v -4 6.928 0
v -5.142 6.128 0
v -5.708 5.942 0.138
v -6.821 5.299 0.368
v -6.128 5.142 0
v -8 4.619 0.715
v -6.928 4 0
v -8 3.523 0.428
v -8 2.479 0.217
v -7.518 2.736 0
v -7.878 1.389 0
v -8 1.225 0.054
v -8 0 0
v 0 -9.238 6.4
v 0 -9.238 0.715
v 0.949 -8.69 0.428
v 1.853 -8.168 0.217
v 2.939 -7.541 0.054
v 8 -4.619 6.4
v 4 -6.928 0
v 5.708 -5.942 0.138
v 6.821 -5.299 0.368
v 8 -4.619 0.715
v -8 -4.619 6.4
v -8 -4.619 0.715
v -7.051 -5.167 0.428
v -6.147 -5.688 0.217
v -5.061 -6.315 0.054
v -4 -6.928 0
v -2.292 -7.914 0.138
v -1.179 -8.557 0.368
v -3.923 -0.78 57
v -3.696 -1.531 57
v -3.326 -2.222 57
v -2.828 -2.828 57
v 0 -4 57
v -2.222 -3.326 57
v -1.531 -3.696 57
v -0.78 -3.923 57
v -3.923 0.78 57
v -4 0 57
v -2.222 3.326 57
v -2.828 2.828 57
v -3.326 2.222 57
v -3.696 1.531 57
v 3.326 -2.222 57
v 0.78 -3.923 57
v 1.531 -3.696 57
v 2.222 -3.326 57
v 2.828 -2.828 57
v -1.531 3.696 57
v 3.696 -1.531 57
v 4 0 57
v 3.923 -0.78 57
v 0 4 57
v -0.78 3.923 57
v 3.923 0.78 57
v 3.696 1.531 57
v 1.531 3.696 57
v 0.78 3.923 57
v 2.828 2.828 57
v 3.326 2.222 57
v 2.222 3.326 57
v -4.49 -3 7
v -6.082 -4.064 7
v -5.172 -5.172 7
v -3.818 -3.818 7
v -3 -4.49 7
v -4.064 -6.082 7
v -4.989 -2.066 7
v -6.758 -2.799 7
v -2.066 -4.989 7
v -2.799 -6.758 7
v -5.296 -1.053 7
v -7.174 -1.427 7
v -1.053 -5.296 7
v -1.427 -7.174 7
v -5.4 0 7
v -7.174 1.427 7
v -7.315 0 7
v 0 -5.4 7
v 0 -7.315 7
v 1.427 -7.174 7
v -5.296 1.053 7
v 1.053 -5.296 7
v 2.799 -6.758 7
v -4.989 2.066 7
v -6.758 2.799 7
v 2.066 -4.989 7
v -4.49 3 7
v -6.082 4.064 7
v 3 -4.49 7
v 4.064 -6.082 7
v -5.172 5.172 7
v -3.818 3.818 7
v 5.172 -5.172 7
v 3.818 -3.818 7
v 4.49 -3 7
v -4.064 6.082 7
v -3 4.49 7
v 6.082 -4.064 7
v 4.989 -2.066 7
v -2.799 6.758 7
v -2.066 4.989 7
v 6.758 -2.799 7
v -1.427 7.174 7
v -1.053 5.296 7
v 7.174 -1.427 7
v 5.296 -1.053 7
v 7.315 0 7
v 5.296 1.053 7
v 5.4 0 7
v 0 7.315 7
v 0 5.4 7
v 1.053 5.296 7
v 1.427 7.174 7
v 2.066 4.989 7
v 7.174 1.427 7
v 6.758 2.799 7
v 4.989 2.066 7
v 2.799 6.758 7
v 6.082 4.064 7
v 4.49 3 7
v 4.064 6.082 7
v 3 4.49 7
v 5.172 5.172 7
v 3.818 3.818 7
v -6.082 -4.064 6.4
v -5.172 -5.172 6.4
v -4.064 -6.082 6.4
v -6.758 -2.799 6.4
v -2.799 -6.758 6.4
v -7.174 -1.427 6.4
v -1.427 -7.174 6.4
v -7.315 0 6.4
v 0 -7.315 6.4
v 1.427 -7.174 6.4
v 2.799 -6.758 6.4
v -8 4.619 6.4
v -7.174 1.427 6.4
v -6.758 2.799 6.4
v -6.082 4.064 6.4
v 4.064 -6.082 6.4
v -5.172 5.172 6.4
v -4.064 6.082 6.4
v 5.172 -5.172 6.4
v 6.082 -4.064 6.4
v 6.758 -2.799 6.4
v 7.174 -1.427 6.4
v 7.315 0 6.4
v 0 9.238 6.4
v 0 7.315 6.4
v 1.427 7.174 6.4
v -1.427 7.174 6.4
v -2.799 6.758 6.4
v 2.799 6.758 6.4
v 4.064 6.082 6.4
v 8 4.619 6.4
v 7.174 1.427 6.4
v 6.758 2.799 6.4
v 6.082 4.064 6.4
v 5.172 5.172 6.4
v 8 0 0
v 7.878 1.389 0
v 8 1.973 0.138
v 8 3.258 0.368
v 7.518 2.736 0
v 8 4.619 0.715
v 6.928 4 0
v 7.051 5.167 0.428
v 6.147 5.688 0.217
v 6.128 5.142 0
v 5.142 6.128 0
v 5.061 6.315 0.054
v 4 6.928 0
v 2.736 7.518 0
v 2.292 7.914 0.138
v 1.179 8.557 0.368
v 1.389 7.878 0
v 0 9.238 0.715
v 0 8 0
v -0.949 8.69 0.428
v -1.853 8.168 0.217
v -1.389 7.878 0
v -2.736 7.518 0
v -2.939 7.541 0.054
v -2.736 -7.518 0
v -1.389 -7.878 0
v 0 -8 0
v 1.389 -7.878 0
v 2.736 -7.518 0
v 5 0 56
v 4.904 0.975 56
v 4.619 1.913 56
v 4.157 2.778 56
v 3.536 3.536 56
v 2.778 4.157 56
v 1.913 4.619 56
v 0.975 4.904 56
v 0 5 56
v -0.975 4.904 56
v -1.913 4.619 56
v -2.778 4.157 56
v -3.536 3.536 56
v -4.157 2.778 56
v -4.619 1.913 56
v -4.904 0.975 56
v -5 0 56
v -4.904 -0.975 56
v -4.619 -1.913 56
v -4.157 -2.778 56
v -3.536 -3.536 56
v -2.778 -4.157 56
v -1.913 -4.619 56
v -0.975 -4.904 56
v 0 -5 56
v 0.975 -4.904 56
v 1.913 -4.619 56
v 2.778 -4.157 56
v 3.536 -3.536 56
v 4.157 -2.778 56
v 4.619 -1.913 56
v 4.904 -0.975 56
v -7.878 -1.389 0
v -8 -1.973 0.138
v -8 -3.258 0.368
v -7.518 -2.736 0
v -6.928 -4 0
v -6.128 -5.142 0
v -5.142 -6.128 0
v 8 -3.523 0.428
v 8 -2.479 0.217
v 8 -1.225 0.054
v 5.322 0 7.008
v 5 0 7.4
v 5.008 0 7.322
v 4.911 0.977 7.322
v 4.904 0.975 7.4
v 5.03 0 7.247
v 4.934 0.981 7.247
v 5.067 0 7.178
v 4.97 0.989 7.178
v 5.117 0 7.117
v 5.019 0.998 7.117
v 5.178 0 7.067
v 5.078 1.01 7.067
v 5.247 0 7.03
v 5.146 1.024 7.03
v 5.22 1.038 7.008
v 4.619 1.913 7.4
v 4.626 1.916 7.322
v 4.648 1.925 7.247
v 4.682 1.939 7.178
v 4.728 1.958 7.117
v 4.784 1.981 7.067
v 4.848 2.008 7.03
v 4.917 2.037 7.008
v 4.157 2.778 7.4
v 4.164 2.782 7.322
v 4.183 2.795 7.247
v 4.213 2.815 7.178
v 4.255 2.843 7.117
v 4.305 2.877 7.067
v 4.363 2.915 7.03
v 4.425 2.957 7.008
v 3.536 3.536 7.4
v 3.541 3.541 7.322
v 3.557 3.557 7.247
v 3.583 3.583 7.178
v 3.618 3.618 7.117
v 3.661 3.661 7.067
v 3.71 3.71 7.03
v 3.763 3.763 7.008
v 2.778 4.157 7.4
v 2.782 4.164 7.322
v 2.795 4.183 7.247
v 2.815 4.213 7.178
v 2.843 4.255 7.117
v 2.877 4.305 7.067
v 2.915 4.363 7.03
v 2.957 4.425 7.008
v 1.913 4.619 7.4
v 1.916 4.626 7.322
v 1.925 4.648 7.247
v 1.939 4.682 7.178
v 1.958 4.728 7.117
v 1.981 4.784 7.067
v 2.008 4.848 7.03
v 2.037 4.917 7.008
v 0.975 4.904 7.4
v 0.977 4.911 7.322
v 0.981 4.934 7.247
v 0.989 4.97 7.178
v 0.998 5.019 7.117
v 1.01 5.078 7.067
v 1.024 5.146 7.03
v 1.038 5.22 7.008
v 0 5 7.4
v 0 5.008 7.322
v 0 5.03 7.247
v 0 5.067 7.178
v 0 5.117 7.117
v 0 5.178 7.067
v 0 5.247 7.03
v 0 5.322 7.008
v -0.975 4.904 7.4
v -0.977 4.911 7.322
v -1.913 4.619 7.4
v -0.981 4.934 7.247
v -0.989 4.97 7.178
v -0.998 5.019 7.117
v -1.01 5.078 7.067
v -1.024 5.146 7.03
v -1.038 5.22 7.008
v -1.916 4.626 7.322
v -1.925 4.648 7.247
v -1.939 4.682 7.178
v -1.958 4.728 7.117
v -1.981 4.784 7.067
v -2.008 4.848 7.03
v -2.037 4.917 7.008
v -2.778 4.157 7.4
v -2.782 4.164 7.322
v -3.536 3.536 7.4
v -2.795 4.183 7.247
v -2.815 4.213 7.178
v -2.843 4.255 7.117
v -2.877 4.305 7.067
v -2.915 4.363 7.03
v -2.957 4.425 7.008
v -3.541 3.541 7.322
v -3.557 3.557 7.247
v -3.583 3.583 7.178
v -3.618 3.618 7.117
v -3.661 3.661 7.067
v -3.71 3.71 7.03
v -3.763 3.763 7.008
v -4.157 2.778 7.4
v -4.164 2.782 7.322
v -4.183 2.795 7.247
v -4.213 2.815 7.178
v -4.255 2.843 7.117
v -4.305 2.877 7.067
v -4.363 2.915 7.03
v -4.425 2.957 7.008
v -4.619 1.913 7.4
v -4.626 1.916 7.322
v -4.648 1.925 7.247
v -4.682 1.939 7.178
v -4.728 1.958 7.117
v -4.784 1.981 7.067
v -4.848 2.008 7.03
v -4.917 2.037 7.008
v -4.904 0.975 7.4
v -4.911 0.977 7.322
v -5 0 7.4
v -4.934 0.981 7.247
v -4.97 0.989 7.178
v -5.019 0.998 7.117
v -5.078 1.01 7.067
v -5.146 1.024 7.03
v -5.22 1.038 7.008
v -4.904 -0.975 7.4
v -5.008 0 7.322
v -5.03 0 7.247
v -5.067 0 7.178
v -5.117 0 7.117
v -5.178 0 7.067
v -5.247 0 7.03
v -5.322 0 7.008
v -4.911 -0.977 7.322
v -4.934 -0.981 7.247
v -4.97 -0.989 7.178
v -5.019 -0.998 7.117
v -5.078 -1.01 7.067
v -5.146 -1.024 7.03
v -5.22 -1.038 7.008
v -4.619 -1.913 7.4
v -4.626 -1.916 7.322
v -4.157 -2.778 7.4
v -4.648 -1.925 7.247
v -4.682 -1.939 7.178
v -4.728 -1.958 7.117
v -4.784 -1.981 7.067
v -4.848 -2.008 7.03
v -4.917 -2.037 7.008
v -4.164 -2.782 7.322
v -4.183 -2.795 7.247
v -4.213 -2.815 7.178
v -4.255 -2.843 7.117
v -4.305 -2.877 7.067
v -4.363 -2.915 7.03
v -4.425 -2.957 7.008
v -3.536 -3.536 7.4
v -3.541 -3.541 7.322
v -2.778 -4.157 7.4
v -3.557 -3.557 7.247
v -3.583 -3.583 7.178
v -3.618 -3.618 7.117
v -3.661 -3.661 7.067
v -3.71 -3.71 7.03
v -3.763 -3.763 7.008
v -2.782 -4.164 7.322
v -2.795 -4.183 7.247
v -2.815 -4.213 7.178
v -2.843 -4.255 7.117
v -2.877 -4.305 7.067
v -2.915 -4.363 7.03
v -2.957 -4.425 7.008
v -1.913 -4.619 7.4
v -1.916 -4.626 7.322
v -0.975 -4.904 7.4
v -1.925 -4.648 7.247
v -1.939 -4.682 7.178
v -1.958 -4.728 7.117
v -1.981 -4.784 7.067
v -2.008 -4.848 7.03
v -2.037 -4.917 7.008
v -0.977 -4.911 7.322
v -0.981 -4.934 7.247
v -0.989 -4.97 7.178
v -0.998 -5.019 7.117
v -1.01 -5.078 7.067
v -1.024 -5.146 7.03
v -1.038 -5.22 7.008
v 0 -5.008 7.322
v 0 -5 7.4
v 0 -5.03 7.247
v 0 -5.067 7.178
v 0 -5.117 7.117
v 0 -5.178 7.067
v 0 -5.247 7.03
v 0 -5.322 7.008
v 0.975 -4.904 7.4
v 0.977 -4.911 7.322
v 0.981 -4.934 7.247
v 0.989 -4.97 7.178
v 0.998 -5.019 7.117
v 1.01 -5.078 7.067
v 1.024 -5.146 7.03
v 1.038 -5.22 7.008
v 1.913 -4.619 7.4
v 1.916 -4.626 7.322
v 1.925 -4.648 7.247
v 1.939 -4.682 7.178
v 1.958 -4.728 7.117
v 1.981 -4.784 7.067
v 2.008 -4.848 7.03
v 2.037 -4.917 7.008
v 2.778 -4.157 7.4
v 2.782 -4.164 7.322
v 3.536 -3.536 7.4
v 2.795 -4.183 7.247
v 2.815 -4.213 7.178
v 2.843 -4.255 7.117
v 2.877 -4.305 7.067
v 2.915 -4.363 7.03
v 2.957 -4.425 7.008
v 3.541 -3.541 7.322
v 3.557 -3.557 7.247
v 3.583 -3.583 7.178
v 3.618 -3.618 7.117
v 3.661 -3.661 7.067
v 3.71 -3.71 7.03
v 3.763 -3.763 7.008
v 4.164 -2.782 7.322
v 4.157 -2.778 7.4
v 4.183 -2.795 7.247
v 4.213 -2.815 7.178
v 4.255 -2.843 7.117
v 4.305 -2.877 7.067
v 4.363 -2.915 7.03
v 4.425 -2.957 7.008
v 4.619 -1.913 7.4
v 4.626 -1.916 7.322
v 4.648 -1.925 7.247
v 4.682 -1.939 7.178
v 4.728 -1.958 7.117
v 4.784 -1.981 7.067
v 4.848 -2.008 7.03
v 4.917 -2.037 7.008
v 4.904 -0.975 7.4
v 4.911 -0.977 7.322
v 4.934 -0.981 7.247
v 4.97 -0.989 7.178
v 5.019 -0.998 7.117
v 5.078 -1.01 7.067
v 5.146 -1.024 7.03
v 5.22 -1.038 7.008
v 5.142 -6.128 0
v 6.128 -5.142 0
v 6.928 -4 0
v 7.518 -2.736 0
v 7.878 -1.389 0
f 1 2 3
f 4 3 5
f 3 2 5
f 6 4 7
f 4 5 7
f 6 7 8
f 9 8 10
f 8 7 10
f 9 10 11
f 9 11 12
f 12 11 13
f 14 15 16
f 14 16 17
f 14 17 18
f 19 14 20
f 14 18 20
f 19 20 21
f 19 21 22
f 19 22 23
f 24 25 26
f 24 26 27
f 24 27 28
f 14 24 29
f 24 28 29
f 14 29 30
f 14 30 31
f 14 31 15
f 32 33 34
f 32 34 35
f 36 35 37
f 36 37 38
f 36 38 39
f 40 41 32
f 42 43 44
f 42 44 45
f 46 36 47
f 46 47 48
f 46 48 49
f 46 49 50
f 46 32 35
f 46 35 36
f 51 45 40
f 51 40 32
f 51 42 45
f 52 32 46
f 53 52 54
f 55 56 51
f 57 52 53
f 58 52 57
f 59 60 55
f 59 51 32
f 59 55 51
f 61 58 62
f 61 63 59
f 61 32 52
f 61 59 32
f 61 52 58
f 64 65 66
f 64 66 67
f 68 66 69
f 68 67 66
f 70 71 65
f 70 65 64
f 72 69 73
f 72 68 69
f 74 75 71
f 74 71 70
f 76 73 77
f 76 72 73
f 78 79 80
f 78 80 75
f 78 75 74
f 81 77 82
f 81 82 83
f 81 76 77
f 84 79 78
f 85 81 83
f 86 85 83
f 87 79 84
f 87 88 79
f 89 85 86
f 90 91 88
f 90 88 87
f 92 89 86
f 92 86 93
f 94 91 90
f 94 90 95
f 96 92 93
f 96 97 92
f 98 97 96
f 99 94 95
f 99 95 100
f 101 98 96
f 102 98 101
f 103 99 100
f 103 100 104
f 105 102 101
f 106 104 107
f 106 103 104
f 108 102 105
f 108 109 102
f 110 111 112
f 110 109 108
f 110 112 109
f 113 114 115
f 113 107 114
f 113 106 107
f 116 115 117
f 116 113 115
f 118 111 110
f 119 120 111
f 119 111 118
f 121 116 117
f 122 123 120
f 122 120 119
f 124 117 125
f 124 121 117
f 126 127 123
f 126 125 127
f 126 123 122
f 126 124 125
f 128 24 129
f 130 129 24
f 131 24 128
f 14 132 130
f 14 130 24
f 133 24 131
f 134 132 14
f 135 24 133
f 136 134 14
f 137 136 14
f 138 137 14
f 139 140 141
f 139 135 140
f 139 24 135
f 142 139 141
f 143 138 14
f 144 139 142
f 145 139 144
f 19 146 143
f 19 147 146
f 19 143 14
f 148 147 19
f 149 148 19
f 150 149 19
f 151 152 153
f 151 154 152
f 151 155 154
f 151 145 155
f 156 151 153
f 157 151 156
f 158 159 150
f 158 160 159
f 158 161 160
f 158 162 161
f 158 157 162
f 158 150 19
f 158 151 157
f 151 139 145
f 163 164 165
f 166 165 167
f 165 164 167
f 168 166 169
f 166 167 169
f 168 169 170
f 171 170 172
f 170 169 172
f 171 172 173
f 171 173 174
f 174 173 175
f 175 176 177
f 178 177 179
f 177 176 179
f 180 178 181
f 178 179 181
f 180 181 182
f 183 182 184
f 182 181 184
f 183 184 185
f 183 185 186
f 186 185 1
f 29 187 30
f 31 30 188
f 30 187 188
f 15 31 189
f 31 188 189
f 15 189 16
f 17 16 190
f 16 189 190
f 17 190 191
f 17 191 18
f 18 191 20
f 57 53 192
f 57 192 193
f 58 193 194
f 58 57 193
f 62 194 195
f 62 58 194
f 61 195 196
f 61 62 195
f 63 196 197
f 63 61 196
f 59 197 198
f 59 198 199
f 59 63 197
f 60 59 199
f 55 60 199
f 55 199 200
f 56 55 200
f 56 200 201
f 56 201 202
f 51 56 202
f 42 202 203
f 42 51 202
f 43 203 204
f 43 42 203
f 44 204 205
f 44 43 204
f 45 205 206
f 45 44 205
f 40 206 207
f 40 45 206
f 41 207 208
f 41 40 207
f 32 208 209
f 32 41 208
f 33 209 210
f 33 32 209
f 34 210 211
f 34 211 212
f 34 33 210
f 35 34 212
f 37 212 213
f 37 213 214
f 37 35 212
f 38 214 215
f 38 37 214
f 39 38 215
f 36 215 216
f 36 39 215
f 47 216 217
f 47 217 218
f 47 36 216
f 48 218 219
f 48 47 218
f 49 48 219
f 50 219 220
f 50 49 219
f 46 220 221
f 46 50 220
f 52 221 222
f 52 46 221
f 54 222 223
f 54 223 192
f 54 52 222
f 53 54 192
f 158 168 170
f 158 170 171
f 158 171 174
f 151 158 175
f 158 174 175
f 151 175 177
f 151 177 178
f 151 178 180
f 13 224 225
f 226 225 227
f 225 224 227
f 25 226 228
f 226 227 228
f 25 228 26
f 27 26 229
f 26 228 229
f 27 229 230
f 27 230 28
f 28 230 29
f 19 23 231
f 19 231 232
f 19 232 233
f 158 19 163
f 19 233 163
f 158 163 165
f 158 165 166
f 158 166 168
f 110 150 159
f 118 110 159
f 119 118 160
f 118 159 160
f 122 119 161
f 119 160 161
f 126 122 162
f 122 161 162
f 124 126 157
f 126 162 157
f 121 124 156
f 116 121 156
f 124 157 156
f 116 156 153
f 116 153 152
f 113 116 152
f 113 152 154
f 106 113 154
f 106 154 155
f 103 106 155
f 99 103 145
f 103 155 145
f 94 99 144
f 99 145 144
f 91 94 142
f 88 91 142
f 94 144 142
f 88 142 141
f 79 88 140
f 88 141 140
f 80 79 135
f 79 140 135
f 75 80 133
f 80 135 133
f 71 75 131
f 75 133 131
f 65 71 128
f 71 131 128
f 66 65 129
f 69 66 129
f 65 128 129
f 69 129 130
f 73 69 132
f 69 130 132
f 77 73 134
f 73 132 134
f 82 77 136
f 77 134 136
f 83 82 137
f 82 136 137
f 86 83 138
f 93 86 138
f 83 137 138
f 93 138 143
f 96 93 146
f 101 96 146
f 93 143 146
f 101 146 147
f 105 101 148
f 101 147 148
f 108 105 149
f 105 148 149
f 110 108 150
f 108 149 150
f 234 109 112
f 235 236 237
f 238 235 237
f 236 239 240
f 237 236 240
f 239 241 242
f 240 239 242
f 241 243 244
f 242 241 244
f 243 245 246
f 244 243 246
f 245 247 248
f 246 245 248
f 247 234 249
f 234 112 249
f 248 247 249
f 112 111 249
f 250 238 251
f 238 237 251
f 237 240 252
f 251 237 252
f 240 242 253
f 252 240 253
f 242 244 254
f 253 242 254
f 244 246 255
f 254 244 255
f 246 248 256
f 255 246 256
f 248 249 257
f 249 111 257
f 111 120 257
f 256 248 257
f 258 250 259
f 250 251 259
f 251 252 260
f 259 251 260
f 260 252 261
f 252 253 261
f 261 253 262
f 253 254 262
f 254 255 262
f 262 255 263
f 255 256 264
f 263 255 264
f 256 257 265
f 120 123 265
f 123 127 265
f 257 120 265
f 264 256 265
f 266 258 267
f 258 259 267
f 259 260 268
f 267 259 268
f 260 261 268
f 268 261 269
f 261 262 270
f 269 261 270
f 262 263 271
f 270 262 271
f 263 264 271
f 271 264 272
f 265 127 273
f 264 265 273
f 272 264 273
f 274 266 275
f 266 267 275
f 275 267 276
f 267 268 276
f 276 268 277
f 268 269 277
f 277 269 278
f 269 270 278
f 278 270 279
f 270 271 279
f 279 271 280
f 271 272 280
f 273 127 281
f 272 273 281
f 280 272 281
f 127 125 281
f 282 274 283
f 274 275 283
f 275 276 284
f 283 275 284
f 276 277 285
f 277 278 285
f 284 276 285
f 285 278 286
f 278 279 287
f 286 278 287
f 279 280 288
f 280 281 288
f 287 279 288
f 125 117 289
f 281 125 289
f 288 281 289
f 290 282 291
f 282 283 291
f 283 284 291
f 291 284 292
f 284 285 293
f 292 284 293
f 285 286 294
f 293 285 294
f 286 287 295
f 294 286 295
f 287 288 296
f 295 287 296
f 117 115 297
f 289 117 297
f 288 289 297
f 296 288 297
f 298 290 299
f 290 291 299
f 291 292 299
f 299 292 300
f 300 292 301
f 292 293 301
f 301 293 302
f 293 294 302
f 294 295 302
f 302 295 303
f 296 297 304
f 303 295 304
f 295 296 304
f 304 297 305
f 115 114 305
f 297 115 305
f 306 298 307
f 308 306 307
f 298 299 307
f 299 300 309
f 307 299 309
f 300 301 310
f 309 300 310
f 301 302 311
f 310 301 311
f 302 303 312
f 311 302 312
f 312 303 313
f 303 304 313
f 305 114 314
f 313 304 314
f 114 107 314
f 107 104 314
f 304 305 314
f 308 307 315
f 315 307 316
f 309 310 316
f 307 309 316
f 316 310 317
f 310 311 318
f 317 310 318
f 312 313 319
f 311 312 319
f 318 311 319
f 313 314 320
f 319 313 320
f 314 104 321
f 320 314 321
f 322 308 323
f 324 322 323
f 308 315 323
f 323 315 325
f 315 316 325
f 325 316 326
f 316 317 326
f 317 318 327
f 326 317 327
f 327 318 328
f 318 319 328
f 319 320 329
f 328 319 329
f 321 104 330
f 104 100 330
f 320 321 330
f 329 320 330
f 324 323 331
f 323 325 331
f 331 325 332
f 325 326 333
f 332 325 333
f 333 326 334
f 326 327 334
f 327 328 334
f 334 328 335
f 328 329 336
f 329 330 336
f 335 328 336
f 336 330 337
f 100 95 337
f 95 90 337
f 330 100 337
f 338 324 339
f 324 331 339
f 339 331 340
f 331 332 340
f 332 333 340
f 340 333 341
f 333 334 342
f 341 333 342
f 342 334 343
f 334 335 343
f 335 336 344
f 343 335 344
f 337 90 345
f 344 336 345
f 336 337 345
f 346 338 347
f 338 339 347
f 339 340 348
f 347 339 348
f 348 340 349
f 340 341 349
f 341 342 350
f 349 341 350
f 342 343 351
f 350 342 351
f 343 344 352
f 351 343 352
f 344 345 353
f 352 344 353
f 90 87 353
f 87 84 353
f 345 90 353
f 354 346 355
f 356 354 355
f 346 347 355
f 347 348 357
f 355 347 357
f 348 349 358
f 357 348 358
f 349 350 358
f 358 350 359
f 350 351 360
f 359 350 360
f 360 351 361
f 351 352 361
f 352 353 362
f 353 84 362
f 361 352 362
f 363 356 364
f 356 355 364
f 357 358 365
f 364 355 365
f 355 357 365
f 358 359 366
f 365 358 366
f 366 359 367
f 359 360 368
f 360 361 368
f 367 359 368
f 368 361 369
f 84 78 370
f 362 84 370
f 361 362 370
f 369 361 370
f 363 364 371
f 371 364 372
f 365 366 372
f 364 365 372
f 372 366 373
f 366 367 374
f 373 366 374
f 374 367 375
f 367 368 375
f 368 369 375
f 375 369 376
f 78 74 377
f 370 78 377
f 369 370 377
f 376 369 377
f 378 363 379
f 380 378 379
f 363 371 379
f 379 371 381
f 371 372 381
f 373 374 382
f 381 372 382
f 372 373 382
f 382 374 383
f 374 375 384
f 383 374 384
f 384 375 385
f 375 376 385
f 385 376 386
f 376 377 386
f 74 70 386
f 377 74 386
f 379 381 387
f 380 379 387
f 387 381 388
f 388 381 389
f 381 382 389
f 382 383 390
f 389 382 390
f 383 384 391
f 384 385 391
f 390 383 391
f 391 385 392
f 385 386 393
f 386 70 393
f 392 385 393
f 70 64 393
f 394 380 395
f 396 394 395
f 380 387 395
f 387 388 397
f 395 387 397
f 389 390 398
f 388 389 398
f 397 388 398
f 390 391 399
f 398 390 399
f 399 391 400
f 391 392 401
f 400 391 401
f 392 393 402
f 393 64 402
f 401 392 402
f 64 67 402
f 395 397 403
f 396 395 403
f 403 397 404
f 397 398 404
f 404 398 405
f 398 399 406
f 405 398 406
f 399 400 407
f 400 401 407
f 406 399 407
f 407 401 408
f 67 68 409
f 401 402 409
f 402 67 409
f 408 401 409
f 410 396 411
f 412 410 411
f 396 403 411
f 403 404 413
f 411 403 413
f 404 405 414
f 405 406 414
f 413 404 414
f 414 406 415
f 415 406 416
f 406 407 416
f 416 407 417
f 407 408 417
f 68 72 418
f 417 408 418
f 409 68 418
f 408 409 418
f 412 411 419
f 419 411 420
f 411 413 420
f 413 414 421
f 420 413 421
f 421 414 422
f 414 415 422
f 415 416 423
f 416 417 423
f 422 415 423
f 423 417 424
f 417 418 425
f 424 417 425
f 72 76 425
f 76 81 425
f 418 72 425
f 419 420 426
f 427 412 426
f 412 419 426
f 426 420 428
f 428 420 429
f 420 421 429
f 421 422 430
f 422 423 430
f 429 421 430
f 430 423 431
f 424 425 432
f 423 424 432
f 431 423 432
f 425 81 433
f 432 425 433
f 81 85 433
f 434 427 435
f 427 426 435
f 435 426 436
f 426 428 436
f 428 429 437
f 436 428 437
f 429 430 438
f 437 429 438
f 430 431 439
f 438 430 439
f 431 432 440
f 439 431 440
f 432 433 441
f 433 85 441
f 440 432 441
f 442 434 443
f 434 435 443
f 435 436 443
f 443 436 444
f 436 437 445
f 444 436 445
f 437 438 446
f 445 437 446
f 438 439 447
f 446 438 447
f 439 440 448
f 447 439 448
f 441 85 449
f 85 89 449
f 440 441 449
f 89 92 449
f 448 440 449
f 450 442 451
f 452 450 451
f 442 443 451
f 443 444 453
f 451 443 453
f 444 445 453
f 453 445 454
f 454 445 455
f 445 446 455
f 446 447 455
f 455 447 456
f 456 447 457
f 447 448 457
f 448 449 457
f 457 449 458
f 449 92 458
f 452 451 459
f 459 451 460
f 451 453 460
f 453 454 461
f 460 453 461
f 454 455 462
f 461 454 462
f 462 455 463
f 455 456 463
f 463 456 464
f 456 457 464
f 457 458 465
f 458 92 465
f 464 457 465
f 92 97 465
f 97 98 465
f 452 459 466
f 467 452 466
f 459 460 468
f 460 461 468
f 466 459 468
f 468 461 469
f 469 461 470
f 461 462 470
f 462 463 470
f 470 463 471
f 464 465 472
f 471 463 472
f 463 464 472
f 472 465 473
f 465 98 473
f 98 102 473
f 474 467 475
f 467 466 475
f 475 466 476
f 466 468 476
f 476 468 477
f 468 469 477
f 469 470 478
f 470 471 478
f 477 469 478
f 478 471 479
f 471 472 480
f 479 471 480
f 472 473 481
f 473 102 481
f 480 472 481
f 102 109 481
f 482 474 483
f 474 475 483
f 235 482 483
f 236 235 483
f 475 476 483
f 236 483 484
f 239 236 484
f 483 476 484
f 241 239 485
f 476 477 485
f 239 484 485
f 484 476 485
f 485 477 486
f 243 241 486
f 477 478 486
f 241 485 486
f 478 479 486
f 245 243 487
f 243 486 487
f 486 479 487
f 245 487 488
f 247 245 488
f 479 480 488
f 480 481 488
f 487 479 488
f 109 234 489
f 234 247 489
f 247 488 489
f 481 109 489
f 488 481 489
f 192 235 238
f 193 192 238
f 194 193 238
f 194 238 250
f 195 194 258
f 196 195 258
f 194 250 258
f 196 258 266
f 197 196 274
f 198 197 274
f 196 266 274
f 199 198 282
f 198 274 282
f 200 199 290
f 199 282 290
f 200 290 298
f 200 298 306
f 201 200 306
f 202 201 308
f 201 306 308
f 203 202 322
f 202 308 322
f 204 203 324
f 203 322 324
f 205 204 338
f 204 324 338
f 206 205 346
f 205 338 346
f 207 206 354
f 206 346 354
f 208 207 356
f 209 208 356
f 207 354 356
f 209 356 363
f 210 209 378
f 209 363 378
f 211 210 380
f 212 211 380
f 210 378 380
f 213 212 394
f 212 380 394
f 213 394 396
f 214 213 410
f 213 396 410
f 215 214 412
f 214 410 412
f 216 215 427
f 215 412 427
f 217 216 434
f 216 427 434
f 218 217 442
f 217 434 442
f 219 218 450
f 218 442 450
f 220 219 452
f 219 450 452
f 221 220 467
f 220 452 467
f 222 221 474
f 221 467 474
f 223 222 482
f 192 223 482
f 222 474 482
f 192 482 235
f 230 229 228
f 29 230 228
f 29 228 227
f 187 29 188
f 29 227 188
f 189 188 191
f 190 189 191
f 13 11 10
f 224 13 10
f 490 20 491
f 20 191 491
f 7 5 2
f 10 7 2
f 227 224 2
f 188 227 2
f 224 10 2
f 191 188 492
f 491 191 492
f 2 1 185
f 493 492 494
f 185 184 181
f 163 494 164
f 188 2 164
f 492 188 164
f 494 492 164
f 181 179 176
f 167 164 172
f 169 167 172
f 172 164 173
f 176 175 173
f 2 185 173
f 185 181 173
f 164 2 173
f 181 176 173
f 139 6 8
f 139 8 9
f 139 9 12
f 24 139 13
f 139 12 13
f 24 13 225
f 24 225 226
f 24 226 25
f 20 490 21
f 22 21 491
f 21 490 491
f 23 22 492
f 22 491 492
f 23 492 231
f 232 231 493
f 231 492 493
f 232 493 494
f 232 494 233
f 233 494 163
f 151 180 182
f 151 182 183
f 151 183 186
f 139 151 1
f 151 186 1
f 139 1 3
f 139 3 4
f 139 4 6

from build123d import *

# Parameters (mm, degrees)
VYSUNOUT1_DEPTH = 6.4
SKICA3_R        = 7.315
VYSUNOUT2_DEPTH = 0.6
SKICA4_R        = 5
VYSUNOUT3_DEPTH = 50
ZKOSIT1_SIZE    = 1
ZAOBLIT1_R      = 0.4


with BuildPart() as part:
    # Skica1 → Vysunout1 (new body)
    with BuildSketch(Plane.XY):
        Polygon((8, -4.618802154), (8, 4.618802154), (0, 9.237604307), (-8, 4.618802154), (-8, -4.618802154), (0, -9.237604307), align=None)
    extrude(amount=VYSUNOUT1_DEPTH)

    # Skica2 → Odebrat otočením1 (revolve, cut)
    with BuildSketch(Plane(origin=(0, 0, 0), x_dir=(1, 0, 0), z_dir=(0, 1, 0))):
        Polygon((8, 0), (19.085125168, 0), (19.085125168, -6.4), align=None)
    revolve(axis=Axis((0, 0, 0), (0, 0, 1)), mode=Mode.SUBTRACT)

    # Skica3 → Vysunout2 (add)
    with BuildSketch(Plane.XY.offset(6.4)):
        Circle(SKICA3_R)
    extrude(amount=VYSUNOUT2_DEPTH)

    # Skica4 → Vysunout3 (add)
    with BuildSketch(Plane.XY.offset(7)):
        Circle(SKICA4_R)
    extrude(amount=VYSUNOUT3_DEPTH)

    # Zkosit1
    zkosit1_edges = [part.edges().sort_by_distance(p)[0] for p in [
        (-5, 0, 57),
    ]]
    chamfer(zkosit1_edges, length=ZKOSIT1_SIZE)

    # Zaoblit1
    zaoblit1_edges = [part.edges().sort_by_distance(p)[0] for p in [
        (-5, 0, 7),
    ]]
    fillet(zaoblit1_edges, radius=ZAOBLIT1_R)


solid = part.part
